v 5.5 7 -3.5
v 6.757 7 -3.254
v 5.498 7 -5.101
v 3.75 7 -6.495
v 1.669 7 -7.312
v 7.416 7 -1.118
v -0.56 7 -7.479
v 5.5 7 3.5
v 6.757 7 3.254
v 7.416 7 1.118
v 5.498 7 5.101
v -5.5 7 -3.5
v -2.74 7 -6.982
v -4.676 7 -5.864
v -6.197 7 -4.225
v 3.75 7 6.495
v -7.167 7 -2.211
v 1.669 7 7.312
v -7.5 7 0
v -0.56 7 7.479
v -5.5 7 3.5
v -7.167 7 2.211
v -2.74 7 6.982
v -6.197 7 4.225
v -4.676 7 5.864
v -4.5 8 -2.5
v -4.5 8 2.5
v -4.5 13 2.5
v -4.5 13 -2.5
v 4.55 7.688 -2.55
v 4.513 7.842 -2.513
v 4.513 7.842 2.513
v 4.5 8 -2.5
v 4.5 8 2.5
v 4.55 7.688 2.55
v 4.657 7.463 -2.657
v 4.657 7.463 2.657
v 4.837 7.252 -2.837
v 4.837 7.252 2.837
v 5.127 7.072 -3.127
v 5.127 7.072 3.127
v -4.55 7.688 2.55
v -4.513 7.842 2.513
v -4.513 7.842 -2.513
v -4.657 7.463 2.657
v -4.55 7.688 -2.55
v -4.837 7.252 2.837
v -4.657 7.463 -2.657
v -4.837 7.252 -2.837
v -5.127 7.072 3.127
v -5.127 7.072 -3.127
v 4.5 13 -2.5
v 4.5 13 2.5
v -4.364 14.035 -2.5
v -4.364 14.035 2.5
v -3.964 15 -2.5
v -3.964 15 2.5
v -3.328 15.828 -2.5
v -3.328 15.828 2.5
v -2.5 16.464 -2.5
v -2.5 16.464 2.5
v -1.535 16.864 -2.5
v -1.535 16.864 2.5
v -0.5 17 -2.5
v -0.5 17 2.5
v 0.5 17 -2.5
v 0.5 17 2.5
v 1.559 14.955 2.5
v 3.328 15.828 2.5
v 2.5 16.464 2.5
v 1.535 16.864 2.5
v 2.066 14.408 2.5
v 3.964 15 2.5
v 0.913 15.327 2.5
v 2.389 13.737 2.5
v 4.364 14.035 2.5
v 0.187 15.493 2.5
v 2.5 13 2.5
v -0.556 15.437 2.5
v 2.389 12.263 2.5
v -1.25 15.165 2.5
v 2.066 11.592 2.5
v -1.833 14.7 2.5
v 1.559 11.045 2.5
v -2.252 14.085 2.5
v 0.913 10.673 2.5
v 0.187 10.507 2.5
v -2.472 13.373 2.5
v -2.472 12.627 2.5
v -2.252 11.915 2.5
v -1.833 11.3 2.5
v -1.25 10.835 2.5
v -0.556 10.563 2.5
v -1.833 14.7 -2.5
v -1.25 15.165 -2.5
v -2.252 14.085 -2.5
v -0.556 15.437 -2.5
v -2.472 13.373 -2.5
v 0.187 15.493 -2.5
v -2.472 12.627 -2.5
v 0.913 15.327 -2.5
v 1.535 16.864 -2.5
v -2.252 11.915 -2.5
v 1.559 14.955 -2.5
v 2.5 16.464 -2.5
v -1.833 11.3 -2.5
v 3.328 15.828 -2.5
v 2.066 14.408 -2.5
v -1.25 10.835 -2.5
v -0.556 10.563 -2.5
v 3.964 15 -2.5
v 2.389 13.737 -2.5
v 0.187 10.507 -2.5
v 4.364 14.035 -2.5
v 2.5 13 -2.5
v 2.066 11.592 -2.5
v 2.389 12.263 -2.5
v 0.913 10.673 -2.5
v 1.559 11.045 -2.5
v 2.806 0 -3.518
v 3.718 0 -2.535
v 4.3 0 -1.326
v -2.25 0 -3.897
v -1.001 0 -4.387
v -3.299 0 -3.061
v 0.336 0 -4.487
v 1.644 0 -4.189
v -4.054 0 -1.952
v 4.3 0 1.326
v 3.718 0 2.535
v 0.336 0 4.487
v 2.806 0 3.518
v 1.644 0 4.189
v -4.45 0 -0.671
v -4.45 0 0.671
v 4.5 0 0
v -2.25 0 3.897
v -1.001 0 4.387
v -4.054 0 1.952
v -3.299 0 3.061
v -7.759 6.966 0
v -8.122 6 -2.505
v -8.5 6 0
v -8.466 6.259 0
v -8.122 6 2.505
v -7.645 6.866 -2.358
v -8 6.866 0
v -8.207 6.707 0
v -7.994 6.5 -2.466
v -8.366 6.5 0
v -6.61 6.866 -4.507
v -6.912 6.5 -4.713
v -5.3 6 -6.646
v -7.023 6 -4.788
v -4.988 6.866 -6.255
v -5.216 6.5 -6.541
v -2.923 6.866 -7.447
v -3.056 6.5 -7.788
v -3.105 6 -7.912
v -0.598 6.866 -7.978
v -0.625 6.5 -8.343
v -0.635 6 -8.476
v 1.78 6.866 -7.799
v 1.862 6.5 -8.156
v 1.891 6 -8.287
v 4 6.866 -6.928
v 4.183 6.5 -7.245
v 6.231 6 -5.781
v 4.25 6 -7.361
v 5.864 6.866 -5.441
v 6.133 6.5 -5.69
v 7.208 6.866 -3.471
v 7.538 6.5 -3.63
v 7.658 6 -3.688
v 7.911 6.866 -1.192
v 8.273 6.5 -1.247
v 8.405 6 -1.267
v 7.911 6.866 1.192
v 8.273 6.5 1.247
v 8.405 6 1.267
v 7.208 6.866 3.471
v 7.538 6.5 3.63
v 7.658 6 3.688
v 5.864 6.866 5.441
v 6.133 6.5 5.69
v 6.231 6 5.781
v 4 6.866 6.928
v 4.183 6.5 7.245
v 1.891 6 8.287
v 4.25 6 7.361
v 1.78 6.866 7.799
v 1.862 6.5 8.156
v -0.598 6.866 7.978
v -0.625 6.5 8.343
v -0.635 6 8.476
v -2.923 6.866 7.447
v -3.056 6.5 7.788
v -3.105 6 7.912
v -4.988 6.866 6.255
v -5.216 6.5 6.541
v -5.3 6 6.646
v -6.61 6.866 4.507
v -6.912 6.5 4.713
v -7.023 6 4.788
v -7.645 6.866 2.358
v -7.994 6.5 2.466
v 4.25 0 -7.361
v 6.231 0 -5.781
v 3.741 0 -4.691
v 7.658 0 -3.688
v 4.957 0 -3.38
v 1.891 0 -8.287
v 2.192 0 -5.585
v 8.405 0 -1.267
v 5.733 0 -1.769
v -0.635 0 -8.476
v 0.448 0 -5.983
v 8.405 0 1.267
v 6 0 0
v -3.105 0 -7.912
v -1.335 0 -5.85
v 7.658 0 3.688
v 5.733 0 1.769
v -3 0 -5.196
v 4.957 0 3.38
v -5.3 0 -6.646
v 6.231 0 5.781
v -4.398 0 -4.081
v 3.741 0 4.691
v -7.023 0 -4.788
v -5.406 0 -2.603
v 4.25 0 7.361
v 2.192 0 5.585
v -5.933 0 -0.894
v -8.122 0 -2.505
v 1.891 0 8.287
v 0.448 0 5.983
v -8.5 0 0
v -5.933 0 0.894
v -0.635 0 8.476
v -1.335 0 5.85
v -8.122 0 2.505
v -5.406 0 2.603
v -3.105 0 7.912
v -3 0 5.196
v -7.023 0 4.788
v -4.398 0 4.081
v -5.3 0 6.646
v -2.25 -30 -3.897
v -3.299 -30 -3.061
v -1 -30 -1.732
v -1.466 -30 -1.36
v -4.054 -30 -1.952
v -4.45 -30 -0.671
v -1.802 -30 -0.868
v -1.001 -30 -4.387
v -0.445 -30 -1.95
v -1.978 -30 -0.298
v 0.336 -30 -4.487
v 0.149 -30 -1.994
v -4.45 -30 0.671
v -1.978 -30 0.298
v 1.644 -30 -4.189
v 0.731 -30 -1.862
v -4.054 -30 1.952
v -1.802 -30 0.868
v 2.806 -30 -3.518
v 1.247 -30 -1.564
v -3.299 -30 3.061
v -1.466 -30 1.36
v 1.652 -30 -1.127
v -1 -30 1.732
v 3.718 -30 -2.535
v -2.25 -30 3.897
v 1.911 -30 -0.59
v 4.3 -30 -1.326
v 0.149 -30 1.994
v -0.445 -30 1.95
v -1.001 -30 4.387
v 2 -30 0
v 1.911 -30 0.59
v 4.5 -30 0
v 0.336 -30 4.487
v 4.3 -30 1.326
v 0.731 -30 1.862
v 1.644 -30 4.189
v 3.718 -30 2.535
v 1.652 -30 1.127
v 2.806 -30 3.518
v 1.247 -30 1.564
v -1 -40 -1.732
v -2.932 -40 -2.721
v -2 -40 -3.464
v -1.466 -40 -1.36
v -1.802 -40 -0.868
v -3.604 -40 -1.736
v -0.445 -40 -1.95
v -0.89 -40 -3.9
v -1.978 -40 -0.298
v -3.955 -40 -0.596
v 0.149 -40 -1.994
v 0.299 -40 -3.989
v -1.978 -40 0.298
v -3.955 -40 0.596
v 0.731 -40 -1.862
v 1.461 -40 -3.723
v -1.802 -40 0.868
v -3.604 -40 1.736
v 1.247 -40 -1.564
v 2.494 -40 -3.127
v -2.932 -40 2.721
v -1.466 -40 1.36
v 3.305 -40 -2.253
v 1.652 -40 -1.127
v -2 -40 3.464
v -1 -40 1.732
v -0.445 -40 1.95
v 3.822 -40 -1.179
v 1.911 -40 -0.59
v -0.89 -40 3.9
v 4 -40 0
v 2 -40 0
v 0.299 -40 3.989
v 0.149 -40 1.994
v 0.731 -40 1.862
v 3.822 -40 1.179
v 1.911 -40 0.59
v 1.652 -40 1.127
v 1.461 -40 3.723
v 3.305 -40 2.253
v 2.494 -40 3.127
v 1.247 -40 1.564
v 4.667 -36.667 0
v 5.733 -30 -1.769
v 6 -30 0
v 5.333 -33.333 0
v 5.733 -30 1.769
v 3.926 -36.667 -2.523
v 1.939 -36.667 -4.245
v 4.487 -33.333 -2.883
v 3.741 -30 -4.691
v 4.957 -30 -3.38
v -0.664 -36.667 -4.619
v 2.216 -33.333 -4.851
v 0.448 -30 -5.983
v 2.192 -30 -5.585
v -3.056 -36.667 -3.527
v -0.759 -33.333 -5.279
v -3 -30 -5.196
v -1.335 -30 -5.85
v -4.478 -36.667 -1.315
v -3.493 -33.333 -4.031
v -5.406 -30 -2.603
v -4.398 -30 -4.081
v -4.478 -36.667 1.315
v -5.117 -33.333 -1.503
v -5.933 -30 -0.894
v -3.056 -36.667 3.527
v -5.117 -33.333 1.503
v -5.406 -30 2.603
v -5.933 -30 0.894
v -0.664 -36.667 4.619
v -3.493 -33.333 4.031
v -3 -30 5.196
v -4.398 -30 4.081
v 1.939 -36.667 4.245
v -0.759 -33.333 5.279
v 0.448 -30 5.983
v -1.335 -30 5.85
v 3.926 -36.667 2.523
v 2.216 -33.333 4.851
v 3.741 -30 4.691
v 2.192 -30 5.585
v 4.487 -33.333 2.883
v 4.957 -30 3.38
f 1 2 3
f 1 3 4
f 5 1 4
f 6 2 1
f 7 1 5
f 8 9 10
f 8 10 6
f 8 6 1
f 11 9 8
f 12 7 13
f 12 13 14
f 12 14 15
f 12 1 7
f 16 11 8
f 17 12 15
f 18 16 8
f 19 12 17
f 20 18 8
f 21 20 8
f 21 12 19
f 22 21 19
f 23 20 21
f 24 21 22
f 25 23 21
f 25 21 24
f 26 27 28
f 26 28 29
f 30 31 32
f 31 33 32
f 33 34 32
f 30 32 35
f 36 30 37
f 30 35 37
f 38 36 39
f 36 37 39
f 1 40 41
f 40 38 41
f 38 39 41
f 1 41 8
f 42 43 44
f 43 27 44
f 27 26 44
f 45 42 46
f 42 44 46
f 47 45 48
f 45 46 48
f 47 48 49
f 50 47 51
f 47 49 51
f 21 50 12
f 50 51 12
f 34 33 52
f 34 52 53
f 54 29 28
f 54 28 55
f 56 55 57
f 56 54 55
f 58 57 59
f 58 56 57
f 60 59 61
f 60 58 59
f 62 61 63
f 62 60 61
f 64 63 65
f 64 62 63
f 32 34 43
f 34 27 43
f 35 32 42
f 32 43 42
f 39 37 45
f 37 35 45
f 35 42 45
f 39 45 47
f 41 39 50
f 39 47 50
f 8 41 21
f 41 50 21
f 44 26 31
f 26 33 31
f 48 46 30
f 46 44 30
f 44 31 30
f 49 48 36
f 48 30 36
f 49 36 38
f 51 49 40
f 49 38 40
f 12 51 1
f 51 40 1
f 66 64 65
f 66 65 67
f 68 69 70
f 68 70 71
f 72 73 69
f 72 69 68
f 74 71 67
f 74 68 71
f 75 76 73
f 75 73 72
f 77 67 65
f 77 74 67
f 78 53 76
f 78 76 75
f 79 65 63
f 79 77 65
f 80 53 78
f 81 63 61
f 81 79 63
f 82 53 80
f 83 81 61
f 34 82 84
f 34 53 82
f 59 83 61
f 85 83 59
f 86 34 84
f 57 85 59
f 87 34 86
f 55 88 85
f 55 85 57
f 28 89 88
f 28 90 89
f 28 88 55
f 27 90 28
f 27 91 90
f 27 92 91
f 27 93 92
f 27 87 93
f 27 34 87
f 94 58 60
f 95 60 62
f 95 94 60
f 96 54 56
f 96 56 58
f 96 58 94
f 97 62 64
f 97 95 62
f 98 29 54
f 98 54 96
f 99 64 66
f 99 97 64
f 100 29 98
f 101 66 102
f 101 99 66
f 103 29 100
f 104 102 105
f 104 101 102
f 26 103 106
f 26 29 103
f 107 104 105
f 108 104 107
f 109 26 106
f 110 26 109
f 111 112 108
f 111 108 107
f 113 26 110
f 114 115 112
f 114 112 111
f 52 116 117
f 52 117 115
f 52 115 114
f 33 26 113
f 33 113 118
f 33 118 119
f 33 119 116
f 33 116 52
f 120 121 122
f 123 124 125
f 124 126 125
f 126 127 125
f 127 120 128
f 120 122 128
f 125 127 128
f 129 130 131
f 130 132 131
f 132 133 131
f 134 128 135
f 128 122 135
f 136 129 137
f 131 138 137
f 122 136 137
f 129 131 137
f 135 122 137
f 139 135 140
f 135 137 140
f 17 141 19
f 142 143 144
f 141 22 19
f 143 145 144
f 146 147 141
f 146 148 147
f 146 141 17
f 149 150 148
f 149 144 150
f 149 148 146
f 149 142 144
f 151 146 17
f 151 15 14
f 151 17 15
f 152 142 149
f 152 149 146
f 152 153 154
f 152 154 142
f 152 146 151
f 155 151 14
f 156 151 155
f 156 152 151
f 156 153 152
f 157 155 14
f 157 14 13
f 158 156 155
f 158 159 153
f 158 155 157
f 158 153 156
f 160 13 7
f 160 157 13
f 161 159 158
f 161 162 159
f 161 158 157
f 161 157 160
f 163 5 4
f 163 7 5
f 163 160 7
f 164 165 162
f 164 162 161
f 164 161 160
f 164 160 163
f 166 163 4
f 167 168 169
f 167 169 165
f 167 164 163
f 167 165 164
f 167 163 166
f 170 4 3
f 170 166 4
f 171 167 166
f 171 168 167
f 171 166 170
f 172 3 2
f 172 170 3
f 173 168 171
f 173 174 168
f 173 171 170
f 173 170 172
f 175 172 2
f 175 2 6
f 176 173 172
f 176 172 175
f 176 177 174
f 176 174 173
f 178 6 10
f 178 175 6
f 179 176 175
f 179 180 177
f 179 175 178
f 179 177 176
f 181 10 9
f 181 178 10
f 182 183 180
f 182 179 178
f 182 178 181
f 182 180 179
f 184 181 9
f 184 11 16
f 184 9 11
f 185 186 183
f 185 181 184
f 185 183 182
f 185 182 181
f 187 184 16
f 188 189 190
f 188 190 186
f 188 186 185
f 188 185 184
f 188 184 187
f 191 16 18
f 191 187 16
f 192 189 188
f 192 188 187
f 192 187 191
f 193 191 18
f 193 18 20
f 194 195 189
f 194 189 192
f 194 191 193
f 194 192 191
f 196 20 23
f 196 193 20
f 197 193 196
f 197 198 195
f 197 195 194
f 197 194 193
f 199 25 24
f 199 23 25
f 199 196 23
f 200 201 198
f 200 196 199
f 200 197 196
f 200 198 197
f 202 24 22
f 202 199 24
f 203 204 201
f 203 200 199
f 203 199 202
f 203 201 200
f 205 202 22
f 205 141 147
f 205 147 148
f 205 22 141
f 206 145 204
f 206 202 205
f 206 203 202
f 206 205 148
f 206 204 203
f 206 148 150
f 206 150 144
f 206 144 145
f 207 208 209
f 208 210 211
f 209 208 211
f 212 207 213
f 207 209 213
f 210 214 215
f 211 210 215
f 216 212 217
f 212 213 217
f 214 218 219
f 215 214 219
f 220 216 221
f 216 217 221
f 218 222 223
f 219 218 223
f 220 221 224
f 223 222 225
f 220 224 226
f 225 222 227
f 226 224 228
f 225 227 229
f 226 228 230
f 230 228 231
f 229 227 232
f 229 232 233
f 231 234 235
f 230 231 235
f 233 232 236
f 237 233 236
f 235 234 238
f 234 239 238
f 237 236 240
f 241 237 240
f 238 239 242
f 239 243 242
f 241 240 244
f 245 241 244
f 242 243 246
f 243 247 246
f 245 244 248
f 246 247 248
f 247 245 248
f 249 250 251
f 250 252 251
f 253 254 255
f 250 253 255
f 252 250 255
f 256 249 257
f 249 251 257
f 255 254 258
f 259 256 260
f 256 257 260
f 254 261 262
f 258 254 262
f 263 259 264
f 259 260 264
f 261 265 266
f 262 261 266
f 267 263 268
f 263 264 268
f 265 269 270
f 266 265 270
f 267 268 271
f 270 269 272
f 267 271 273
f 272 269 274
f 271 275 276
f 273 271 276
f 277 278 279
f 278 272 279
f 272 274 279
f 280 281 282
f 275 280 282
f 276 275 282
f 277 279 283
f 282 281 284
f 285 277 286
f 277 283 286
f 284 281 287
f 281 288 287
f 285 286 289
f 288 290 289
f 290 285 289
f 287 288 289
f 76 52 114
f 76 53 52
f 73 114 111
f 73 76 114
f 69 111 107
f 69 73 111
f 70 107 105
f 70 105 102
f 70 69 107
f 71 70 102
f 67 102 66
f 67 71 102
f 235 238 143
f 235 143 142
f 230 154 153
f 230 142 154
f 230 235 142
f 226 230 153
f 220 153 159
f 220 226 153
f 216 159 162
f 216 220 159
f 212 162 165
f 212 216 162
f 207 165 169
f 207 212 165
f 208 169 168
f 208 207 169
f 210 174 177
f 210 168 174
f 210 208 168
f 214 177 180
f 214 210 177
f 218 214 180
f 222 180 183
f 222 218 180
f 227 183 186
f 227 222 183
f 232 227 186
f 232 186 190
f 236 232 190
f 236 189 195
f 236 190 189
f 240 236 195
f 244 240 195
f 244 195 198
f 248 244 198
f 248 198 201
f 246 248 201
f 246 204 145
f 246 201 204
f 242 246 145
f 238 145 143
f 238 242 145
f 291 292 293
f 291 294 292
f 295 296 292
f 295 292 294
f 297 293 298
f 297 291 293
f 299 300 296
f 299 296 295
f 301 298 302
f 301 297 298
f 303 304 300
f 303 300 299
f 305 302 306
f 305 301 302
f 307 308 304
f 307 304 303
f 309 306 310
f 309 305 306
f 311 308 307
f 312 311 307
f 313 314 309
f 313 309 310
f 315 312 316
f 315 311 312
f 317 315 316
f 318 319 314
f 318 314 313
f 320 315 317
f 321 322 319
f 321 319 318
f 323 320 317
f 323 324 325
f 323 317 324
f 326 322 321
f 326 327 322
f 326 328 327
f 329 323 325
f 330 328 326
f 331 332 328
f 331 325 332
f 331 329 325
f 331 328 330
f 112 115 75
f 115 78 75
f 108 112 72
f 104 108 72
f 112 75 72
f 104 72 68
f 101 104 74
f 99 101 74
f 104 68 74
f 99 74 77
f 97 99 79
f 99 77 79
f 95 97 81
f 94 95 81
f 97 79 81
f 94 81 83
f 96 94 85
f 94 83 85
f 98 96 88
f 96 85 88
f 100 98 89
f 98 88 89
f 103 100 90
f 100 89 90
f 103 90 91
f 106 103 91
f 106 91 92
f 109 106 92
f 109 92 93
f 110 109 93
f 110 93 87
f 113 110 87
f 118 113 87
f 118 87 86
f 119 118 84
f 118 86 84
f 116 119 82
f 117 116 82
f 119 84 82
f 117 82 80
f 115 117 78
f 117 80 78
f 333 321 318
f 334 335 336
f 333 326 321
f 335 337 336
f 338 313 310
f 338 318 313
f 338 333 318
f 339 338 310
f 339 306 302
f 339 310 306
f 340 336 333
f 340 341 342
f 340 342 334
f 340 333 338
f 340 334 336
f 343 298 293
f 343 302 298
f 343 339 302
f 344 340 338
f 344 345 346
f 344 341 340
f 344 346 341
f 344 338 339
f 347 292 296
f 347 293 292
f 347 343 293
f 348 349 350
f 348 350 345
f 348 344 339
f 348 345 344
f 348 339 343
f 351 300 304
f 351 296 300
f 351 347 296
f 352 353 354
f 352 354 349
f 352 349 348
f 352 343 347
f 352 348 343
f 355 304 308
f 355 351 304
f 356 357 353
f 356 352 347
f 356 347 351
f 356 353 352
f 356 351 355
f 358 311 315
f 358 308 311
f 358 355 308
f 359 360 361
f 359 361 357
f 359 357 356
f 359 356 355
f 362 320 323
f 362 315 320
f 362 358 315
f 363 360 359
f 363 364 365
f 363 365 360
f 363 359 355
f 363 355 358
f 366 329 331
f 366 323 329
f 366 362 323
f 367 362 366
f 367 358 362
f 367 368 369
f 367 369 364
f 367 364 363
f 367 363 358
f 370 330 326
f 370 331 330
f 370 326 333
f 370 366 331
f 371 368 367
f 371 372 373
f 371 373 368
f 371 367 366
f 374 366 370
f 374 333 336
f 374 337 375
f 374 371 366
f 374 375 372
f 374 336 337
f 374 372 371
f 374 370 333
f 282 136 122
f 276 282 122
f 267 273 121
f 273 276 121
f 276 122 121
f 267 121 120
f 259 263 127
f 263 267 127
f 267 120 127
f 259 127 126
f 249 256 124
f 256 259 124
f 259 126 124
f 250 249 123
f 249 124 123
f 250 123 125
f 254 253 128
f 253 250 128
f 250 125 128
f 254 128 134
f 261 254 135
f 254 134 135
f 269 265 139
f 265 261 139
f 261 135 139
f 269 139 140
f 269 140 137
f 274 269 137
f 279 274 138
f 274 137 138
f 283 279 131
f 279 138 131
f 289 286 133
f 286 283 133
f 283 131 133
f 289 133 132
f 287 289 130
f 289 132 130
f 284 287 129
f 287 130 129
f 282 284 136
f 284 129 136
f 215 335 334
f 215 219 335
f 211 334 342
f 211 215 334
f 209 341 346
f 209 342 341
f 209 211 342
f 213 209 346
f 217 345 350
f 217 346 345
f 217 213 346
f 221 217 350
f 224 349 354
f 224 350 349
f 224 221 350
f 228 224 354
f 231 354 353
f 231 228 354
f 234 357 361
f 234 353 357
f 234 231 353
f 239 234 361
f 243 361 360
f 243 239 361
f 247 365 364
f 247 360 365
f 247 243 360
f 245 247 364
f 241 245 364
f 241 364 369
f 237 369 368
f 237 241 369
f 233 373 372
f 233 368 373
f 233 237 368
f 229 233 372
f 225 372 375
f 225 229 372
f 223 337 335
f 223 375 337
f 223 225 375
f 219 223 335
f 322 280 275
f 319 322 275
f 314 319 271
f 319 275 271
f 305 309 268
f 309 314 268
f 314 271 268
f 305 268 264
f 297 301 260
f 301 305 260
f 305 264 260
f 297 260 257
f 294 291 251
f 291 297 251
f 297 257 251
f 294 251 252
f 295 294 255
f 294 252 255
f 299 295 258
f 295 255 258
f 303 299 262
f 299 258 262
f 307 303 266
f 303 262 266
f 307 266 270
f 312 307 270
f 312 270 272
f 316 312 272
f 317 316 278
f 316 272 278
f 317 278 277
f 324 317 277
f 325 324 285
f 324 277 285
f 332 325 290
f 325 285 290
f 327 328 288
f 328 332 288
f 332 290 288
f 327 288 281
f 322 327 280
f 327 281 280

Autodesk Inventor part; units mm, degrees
ref_plane "YZ Plane" through (0, 0, 0) normal (1, 0, 0) x (0, 1, 0)
ref_plane "XZ Plane" through (0, 0, 0) normal (0, 1, 0) x (-1, 0, 0)
ref_plane "XY Plane" through (0, 0, 0) normal (0, 0, 1) x (1, 0, 0)
sketch "Szkic1" plane through (0, 0, 0) normal (0, 1, 0) x (-1, 0, 0)
  circle A0 centre (0, 0) radius 8.5
  dimension "d0" = 17
extrude "Wyciągnięcie proste1" add sketch "Szkic1" along normal blind 7
sketch "Szkic2" plane through (0, 7, 0) normal (0, 1, 0) x (1, 0, 0)
  line L0 (4.5, -2.5) -> (-4.5, -2.5)
  line L1 (-4.5, -2.5) -> (-4.5, 2.5)
  line L2 (-4.5, 2.5) -> (4.5, 2.5)
  line L3 (4.5, 2.5) -> (4.5, -2.5)
  line L4 (4.5, -2.5) -> (-4.5, 2.5) construction
  line L5 (-4.5, -2.5) -> (4.5, 2.5) construction
  point P0 (0, 0)
  dimension "d3" = 9
  dimension "d4" = 5
extrude "Wyciągnięcie proste2" add sketch "Szkic2" along normal blind 10
fillet "Zaokrąglenie1" radius 4 2 edges at (4.5, 17, 0) (-4.5, 17, 0)
sketch "Szkic3" plane through (-4.5, 7, 2.5) normal (0, 0, 1) x (1, 0, 0)
  arc A0 (9, 6) -> (5, 10) centre (5, 6) ccw projected
  arc A1 (4, 10) -> (0, 6) centre (4, 6) ccw projected
  circle A2 centre (4.5, 6) radius 2.5
  point P0 (4.5, -7)
  dimension "d8" = 5
extrude "Wyciągnięcie proste3" cut sketch "Szkic3" against normal blind 10
fillet "Zaokrąglenie2" radius 1 1 edges at (8.5, 7, 0)
fillet "Zaokrąglenie3" radius 1 4 edges at (0, 7, 2.5) (4.5, 7, 0) (0, 7, -2.5) (-4.5, 7, 0)
sketch "Szkic4" plane through (0, 0, 0) normal (0, -1, 0) x (1, 0, 0)
  circle A0 centre (0, 0) radius 6
  circle A1 centre (0, 0) radius 4.5
  dimension "d13" = 12
  dimension "d21" = 9
extrude "Wyciągnięcie proste4" add sketch "Szkic4" along normal blind 30 from surface at 0
thread "Gwint1" size "M12x1.75" class "6g" standard "ANSI Metric M Profile" length 15
sketch "Szkic5" plane through (0, -30, 0) normal (0, -1, 0) x (1, 0, 0)
  circle A0 centre (0, 0) radius 2
  circle A1 centre (0, 0) radius 6
  dimension "d22" = 4
extrude "Wyciągnięcie proste5" add sketch "Szkic5" along normal blind 10
chamfer "Faza2" distance 2 distance2 10 1 edges at (-6, -40, 0) measured on face at (4.5892, -40, -0.6382)
properties part number "Korpus" material "Aluminum 6061"
